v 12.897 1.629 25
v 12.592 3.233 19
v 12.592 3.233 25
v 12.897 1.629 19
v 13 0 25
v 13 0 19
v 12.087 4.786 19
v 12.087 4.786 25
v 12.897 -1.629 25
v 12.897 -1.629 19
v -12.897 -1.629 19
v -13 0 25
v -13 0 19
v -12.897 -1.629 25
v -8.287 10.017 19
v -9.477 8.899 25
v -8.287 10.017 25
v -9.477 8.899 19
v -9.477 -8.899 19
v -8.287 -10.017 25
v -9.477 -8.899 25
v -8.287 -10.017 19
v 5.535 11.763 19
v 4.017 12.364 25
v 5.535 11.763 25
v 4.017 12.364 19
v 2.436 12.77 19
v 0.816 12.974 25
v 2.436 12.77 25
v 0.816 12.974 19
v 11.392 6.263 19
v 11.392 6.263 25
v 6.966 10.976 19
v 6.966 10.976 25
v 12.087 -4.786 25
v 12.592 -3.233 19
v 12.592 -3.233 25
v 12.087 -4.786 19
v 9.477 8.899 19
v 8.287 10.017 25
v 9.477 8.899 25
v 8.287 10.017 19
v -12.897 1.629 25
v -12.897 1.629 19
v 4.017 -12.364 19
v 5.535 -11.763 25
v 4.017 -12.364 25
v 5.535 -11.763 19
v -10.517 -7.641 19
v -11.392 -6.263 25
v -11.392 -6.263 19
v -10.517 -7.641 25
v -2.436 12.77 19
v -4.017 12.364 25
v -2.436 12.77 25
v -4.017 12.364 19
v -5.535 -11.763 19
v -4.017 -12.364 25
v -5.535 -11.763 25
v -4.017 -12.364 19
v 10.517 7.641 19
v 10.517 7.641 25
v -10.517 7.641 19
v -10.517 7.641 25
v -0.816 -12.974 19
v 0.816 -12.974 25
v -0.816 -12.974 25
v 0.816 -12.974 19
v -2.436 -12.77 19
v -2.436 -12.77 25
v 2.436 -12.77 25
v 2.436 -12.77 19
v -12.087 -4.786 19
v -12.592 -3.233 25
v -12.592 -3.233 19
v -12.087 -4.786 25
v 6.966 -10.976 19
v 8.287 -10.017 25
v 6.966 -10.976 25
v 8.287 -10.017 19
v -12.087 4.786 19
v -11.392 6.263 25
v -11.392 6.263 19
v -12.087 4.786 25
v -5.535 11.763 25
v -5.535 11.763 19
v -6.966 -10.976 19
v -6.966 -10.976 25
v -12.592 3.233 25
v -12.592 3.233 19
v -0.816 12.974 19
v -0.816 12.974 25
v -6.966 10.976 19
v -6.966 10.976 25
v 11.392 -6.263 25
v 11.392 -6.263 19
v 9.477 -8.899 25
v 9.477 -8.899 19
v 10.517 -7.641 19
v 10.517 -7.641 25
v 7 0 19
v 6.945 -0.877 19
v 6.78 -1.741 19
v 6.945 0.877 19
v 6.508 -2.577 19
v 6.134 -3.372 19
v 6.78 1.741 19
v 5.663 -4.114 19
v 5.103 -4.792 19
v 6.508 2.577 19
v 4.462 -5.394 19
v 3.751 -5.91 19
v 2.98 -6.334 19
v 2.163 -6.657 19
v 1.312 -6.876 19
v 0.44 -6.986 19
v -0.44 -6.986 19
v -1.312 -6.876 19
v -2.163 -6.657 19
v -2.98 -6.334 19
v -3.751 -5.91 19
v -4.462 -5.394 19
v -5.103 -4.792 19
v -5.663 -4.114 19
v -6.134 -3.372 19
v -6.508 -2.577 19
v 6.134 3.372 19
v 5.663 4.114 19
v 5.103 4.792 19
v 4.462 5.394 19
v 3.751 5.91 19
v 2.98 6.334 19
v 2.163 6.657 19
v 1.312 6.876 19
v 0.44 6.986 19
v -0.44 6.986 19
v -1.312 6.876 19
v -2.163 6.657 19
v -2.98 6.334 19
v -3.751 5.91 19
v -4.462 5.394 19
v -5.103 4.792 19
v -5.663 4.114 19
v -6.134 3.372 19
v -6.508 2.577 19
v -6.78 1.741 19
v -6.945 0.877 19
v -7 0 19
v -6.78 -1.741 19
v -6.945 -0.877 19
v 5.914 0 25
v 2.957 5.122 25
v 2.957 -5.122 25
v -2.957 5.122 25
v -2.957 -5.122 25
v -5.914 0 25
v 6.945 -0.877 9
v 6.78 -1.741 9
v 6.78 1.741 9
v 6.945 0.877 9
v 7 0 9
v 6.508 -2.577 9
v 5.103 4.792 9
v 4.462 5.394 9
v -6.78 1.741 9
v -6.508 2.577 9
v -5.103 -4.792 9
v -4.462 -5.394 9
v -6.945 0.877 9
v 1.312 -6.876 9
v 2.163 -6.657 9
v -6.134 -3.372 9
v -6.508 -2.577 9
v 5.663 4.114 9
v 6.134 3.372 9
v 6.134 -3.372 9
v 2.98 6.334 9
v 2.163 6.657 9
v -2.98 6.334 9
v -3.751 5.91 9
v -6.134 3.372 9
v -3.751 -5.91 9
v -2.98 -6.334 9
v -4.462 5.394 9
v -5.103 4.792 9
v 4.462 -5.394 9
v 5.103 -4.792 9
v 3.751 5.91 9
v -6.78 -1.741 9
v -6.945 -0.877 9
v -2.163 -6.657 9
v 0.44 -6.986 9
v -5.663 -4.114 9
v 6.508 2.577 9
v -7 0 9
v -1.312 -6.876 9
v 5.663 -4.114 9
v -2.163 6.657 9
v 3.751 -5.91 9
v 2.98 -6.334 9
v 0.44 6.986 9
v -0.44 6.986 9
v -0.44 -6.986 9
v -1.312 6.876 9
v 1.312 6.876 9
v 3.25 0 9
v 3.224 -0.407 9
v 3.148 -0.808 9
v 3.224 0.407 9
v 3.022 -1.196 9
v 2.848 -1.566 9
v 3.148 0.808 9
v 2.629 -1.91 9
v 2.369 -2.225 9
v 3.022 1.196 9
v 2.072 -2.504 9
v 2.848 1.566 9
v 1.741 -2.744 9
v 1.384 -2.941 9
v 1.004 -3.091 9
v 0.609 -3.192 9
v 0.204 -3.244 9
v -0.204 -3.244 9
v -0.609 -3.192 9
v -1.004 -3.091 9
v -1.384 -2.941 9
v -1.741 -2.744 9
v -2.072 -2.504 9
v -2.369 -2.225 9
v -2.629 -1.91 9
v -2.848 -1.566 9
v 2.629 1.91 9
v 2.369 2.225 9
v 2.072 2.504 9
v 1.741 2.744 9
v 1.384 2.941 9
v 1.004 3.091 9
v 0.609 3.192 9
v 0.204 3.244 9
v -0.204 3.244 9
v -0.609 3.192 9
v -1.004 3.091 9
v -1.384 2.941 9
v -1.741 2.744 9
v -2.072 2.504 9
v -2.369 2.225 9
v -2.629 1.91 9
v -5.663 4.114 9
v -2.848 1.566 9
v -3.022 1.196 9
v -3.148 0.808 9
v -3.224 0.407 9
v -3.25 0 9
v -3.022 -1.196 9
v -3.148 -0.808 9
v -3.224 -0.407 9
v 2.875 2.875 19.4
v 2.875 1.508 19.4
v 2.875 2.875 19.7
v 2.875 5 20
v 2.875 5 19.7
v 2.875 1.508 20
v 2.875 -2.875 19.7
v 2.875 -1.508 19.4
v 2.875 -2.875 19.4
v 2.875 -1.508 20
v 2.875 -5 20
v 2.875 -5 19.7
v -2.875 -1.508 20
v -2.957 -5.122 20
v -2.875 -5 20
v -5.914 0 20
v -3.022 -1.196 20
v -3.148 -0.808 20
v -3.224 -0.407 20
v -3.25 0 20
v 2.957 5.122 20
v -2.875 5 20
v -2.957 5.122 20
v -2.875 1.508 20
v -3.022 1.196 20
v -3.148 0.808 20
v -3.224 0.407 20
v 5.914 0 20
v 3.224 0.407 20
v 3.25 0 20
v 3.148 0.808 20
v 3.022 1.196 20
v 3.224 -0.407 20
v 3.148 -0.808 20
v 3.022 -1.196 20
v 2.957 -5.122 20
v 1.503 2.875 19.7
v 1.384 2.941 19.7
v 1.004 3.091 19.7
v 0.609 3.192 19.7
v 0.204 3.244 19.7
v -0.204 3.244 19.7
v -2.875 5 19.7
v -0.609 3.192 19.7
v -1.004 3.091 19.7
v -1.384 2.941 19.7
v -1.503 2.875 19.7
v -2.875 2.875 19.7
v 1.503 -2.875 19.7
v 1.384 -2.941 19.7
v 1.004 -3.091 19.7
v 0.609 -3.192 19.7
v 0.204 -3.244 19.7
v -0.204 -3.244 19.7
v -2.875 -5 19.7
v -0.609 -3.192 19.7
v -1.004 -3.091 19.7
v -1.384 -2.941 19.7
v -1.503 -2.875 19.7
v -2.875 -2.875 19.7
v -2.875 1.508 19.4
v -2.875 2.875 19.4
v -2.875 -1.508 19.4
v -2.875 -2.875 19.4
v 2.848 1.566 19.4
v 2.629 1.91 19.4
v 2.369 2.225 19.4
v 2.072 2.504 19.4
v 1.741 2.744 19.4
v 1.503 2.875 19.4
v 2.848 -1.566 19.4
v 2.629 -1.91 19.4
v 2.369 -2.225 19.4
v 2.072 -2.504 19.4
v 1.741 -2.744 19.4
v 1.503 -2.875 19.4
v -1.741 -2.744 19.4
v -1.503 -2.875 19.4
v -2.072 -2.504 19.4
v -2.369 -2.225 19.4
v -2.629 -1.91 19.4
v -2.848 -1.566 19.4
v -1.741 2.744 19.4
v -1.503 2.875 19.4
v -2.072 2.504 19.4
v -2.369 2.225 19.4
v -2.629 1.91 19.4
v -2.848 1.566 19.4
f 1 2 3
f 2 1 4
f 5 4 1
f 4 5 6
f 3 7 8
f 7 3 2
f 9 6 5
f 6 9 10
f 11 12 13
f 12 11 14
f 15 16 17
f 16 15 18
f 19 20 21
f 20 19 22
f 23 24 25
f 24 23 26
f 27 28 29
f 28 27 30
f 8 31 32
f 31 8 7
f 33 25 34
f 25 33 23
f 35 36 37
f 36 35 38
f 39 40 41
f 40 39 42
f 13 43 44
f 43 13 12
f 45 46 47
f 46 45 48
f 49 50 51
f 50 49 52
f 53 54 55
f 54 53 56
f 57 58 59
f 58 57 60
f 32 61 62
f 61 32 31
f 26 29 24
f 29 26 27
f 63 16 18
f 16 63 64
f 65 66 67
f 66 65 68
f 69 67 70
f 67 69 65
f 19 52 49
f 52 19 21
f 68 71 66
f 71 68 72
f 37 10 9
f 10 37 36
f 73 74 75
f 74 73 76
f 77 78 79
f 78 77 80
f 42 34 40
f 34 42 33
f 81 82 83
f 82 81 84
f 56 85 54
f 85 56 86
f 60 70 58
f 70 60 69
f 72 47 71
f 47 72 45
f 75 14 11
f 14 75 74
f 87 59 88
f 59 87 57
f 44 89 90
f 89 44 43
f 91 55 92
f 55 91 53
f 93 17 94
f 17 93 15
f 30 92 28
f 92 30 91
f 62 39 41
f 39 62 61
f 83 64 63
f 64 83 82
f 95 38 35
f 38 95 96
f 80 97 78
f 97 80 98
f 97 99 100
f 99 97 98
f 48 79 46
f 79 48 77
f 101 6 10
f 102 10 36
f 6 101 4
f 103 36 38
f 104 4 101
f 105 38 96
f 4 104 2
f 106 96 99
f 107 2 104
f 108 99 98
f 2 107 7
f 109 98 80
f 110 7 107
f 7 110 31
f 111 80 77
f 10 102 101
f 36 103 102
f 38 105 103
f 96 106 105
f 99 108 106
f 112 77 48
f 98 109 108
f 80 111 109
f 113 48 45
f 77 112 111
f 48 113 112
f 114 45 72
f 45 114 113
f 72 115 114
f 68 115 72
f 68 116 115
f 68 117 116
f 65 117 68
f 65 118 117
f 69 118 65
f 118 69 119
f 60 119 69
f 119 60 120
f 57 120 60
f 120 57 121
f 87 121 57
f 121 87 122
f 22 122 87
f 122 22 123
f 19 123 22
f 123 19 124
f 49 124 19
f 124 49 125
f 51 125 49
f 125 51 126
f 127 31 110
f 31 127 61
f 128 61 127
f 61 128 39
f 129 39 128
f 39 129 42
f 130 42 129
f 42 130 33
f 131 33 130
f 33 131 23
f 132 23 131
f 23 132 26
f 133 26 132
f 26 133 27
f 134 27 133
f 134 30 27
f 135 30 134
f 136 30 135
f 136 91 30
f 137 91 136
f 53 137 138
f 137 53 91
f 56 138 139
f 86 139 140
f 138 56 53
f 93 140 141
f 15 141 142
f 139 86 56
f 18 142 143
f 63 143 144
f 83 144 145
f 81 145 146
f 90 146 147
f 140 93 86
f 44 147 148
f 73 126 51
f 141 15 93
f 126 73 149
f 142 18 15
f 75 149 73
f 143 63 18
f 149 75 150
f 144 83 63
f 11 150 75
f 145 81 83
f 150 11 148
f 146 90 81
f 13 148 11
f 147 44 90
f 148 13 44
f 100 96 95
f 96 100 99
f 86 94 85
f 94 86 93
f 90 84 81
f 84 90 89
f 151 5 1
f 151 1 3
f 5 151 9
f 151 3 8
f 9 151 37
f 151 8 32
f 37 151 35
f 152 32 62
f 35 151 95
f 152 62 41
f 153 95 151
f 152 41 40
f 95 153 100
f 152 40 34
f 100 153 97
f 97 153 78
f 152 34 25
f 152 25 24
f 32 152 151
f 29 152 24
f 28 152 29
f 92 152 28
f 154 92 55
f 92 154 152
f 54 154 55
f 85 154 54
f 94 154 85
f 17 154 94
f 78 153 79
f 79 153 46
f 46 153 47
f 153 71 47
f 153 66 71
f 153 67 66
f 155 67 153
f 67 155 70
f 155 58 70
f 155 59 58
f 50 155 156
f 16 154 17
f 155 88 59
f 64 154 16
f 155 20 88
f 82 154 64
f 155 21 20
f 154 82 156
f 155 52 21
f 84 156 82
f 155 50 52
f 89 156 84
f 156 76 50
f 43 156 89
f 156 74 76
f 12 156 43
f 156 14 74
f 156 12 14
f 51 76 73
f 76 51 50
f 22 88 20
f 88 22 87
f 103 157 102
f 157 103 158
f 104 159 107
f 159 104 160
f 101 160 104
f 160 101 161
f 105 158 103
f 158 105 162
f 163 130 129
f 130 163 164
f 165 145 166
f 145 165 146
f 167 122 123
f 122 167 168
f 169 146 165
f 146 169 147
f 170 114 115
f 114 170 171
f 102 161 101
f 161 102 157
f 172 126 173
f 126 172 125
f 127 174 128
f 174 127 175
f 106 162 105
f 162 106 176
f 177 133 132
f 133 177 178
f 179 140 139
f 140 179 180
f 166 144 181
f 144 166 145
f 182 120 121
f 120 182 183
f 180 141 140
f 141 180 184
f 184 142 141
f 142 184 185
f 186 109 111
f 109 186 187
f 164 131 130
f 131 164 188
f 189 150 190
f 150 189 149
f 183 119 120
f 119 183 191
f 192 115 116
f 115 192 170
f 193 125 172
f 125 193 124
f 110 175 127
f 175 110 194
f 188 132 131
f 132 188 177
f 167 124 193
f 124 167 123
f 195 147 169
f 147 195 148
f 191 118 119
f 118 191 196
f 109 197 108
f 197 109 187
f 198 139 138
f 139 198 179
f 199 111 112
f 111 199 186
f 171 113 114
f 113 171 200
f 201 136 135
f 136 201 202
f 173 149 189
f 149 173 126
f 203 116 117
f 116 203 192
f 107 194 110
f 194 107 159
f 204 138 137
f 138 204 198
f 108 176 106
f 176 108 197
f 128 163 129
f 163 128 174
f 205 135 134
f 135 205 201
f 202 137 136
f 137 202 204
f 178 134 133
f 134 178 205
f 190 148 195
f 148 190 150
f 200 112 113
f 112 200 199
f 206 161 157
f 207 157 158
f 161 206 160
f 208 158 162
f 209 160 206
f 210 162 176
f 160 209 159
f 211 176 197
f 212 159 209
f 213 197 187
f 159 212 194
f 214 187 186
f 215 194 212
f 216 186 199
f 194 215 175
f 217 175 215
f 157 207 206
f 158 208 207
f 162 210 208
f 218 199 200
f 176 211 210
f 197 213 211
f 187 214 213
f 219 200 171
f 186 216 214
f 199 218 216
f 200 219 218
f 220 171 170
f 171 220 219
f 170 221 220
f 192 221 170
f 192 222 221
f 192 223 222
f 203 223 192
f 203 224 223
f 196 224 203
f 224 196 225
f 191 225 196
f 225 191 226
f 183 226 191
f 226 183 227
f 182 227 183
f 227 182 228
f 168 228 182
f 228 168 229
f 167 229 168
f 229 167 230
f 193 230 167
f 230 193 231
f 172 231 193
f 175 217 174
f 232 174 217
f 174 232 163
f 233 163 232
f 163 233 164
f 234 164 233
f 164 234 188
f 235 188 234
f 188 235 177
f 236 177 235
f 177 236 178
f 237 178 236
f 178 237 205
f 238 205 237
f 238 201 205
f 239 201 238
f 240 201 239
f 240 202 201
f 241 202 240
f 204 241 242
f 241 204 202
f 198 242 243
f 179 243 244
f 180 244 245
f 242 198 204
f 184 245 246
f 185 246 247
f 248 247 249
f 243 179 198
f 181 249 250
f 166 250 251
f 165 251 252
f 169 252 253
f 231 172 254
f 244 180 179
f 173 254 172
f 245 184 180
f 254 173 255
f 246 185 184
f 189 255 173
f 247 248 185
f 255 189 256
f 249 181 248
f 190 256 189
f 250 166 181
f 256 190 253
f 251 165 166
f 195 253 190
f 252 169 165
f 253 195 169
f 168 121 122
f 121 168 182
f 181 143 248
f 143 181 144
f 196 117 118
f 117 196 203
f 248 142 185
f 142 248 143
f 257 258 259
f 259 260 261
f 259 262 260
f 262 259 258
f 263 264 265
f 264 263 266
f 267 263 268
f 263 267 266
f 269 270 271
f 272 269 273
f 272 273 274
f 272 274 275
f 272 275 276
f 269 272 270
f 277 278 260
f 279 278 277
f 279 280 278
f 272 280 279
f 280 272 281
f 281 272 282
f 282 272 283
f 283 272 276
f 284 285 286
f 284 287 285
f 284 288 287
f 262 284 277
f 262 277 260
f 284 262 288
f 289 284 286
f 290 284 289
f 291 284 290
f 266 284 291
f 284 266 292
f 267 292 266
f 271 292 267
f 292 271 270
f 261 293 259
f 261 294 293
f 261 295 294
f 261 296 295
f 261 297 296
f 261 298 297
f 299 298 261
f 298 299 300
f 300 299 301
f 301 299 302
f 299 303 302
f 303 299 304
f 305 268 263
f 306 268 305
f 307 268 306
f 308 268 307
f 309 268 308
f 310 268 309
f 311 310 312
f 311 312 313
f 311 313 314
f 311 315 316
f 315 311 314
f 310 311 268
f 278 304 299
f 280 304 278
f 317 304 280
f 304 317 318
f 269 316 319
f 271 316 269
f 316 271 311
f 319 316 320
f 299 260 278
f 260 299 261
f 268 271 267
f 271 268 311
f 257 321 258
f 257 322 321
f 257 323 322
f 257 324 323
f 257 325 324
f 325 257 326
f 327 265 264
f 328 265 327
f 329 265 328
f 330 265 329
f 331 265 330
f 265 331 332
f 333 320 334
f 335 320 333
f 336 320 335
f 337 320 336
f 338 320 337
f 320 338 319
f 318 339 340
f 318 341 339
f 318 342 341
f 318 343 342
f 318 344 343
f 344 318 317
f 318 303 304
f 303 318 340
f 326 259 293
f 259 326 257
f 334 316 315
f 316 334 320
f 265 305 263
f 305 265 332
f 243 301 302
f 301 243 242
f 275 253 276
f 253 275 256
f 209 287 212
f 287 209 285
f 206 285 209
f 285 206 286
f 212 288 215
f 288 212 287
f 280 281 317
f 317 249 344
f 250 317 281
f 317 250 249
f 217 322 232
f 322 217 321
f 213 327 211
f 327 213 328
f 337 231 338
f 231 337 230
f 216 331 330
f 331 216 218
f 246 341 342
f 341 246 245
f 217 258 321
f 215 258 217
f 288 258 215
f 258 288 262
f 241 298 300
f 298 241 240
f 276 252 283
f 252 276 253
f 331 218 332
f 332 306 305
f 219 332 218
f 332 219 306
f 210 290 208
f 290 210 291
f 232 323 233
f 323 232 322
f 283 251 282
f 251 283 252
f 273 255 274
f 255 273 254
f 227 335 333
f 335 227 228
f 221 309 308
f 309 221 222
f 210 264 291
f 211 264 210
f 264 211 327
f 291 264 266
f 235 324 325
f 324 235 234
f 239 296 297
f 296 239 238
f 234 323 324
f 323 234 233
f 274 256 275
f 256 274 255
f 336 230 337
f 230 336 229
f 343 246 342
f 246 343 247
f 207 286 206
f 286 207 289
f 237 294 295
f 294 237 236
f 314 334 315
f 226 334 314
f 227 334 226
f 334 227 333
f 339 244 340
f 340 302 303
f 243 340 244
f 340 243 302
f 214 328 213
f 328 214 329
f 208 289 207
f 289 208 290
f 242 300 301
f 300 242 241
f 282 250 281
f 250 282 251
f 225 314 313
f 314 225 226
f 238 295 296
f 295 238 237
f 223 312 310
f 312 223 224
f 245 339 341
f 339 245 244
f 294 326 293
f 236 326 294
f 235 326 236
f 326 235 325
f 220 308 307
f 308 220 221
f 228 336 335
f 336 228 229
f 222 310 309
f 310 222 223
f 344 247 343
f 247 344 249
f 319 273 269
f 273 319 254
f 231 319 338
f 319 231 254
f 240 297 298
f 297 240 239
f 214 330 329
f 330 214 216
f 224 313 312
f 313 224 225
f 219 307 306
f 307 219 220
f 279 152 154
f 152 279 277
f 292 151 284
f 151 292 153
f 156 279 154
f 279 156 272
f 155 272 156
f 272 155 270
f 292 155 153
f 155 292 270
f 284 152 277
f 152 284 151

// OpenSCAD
$fn = 50;


difference() {
	union() {
		translate(v = [0, 0, 19.0000000000]) {
			cylinder(h = 6, r = 13.0000000000);
		}
		translate(v = [0, 0, 9.0000000000]) {
			cylinder(h = 16, r = 7.0000000000);
		}
	}
	union() {
		translate(v = [0, 0, 25]) {
			rotate(a = [0, 0, 0]) {
				difference() {
					union() {
						#translate(v = [-2.8750000000, -5.0000000000, -5.3000000000]) {
							cube(size = [5.7500000000, 10, 0.3000000000]);
						}
						#translate(v = [-2.8750000000, -2.8750000000, -5.6000000000]) {
							cube(size = [5.7500000000, 5.7500000000, 0.3000000000]);
						}
						#translate(v = [-2.8750000000, -5.0000000000, 0]) {
							cube(size = [5.7500000000, 10, 0.3000000000]);
						}
						#translate(v = [-2.8750000000, -2.8750000000, 0.3000000000]) {
							cube(size = [5.7500000000, 5.7500000000, 0.3000000000]);
						}
						#translate(v = [0, 0, -100.0000000000]) {
							cylinder(h = 200, r = 3.2500000000);
						}
						translate(v = [0, 0, -5]) {
							#linear_extrude(height = 5) {
								polygon(points = [[5.9142500000, 0.0000000000], [2.9571250000, 5.1218907443], [-2.9571250000, 5.1218907443], [-5.9142500000, 0.0000000000], [-2.9571250000, -5.1218907443], [2.9571250000, -5.1218907443]]);
							}
						}
						#translate(v = [-2.8750000000, -5.0000000000, -5.3000000000]) {
							cube(size = [5.7500000000, 10, 0.3000000000]);
						}
						#translate(v = [-2.8750000000, -2.8750000000, -5.6000000000]) {
							cube(size = [5.7500000000, 5.7500000000, 0.3000000000]);
						}
						#translate(v = [-2.8750000000, -5.0000000000, 0]) {
							cube(size = [5.7500000000, 10, 0.3000000000]);
						}
						#translate(v = [-2.8750000000, -2.8750000000, 0.3000000000]) {
							cube(size = [5.7500000000, 5.7500000000, 0.3000000000]);
						}
						#translate(v = [0, 0, -100.0000000000]) {
							cylinder(h = 200, r = 3.2500000000);
						}
						#translate(v = [-2.8750000000, -5.0000000000, -5.3000000000]) {
							cube(size = [5.7500000000, 10, 0.3000000000]);
						}
						#translate(v = [-2.8750000000, -2.8750000000, -5.6000000000]) {
							cube(size = [5.7500000000, 5.7500000000, 0.3000000000]);
						}
						#translate(v = [-2.8750000000, -5.0000000000, 0]) {
							cube(size = [5.7500000000, 10, 0.3000000000]);
						}
						#translate(v = [-2.8750000000, -2.8750000000, 0.3000000000]) {
							cube(size = [5.7500000000, 5.7500000000, 0.3000000000]);
						}
						#translate(v = [0, 0, -100.0000000000]) {
							cylinder(h = 200, r = 3.2500000000);
						}
					}
					union();
				}
			}
		}
		#translate(v = [0, 0, -100.0000000000]) {
			cylinder(h = 200, r = 3.2500000000);
		}
	}
}
